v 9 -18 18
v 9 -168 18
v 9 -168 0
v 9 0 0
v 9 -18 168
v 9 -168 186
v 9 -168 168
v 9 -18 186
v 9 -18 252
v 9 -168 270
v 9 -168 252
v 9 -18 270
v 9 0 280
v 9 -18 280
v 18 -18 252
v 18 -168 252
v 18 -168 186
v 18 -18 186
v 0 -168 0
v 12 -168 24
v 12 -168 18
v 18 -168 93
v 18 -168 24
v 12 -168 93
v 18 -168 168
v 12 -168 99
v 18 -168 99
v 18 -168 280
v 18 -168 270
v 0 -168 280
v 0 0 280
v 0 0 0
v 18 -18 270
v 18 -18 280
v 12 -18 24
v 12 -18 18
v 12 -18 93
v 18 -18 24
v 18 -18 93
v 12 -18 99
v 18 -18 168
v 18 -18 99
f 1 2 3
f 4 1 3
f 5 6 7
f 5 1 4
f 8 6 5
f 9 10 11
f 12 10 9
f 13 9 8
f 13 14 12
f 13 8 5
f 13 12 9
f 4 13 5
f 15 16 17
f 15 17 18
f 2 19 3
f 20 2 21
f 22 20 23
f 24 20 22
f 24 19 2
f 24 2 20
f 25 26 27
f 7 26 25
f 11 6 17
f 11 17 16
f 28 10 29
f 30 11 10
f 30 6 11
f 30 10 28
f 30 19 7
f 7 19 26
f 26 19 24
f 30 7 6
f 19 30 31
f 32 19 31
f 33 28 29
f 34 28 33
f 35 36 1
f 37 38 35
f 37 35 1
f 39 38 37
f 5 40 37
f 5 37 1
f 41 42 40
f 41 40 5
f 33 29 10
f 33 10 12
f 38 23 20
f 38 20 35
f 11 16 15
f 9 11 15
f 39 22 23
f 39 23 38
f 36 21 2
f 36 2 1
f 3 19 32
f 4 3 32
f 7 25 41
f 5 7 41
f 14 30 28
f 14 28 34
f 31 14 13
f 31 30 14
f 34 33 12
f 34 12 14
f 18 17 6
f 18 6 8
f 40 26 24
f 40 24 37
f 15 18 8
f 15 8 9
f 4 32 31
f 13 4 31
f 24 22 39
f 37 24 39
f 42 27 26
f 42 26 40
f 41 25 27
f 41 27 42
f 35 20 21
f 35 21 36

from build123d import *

# Parameters (mm, degrees)
SKETCH_W        = 168
SKETCH_H        = 280
PAD_DEPTH       = 18
SKETCH001_W     = 168
SKETCH001_H     = 18
POCKET_DEPTH    = 9
SKETCH002_W     = 18
SKETCH002_H     = 280
POCKET001_DEPTH = 9
SKETCH003_W     = 168
SKETCH003_H     = 6
POCKET002_DEPTH = 6


with BuildPart() as part:
    # Sketch → Pad (new body)
    with BuildSketch(Plane.YZ):
        with Locations((-84, 140)):
            Rectangle(SKETCH_W, SKETCH_H)
    extrude(amount=PAD_DEPTH)

    # Sketch001 (on Face6 of Pad) → Pocket (cut)
    with BuildSketch(Plane.YZ.offset(18)):
        with Locations((-84, 9)):
            Rectangle(SKETCH001_W, SKETCH001_H)
        with Locations((-84, 177)):
            Rectangle(SKETCH001_W, SKETCH001_H)
        with Locations((-84, 261)):
            Rectangle(SKETCH001_W, SKETCH001_H)
    extrude(amount=-POCKET_DEPTH, mode=Mode.SUBTRACT)

    # Sketch002 (on Face35 of Pocket) → Pocket001 (cut)
    with BuildSketch(Plane.YZ.offset(18)):
        with Locations((-9, 140)):
            Rectangle(SKETCH002_W, SKETCH002_H)
    extrude(amount=-POCKET001_DEPTH, mode=Mode.SUBTRACT)

    # Sketch003 (on Face12 of Pocket001) → Pocket002 (cut)
    with BuildSketch(Plane.YZ.offset(18)):
        with Locations((-84, 21)):
            Rectangle(SKETCH003_W, SKETCH003_H)
        with Locations((-84, 96)):
            Rectangle(SKETCH003_W, SKETCH003_H)
    extrude(amount=-POCKET002_DEPTH, mode=Mode.SUBTRACT)


solid = part.part
